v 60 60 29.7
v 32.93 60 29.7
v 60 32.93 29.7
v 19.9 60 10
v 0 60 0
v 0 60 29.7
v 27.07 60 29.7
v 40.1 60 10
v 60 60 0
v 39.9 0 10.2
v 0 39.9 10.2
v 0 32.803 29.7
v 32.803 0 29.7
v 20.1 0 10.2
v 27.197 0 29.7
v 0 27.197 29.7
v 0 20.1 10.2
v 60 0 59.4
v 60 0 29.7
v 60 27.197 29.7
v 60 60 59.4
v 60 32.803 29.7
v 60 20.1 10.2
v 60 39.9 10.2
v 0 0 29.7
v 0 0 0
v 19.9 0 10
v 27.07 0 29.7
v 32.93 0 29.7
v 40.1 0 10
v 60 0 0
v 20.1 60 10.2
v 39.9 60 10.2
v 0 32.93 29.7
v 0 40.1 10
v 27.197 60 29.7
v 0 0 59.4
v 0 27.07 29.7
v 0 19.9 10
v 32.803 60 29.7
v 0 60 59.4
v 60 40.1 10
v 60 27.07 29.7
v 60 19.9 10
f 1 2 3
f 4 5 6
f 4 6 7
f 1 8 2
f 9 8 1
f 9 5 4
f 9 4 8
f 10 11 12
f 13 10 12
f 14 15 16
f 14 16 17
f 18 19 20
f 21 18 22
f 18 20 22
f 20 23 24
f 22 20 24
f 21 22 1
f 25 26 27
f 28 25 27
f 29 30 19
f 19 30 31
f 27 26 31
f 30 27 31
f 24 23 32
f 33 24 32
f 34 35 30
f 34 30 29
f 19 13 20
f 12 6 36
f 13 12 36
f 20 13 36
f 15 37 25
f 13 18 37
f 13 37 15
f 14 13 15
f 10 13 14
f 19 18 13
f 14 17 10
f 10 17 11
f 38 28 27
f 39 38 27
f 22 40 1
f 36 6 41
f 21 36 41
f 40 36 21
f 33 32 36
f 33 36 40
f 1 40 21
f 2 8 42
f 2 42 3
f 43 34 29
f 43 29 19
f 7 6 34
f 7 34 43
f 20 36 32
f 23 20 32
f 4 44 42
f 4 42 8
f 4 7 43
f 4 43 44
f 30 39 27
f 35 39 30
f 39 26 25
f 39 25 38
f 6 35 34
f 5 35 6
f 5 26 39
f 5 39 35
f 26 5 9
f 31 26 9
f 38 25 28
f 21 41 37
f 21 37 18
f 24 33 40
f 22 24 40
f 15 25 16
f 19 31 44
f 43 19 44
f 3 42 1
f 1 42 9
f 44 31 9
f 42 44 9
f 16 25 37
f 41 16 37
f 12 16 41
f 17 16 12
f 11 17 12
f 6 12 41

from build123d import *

# Parameters (mm, degrees)
F0_W      = 60
F0_H      = 60
F1_DEPTH  = 29.7
F7_W      = 60
F7_H      = 60
F8_DEPTH  = 29.7
F9_W      = 2.0984072936
F9_H      = 7.3124578476
F14_DEPTH = 59.4


with BuildPart() as f1:
    # F0 (on Top) → F1 (new body)
    with BuildSketch(Plane.XY):
        with Locations((30, 30)):
            Rectangle(F0_W, F0_H)
    extrude(amount=F1_DEPTH)

    # F4: sweep along a path in F3
    with BuildLine(Plane.XY.offset(29.7)) as f4_path:
        Line((60, 0), (0, 60))
    # F2 (on face) → F4 (sweep, cut)
    with BuildSketch(Plane.XZ):
        Polygon((32.929786385, 29.7), (27.070213615, 29.7), (19.9, 10), (40.1, 10), align=None)
    sweep(path=f4_path.line, mode=Mode.SUBTRACT)

    # F6: sweep along a path in F3
    with BuildLine(Plane.XY.offset(29.7)) as f6_path:
        Line((60, 0), (0, 60))
    # F5 (on face) → F6 (sweep, cut)
    with BuildSketch(Plane.YZ.offset(60)):
        Polygon((32.929786385, 29.7), (27.070213615, 29.7), (19.9, 10), (40.1, 10), align=None)
    sweep(path=f6_path.line, mode=Mode.SUBTRACT)


with BuildPart() as f8:
    # F7 (on face) → F8 (new body)
    with BuildSketch(Plane.XY.offset(29.7)):
        with Locations((30, 30)):
            Rectangle(F7_W, F7_H)
    extrude(amount=F8_DEPTH)

    # F10: sweep along a path in F3
    with BuildLine(Plane.XY.offset(29.7)) as f10_path:
        Line((60, 0), (0, 60))
    # F9 (on face) → F10 (sweep)
    with BuildSketch(Plane.YZ.offset(60)):
        with Locations((29.8194439733, 33.3562289238)):
            Rectangle(F9_W, F9_H)
        Polygon((28.7702403265, 29.7), (27.1974195682, 29.7), (20.1, 10.2), (39.9, 10.2), (32.8025804318, 29.7), (30.8686476201, 29.7), align=None)
    sweep(path=f10_path.line)

    # F12: sweep along a path in F3
    with BuildLine(Plane.XY.offset(29.7)) as f12_path:
        Line((60, 0), (0, 60))
    # F11 (on face) → F12 (sweep)
    with BuildSketch(Plane.XZ):
        Polygon((32.8025804318, 29.7), (27.1974195682, 29.7), (20.1, 10.2), (39.9, 10.2), align=None)
    sweep(path=f12_path.line)

    # F13 (on face) → F14 (cut, through all)
    with BuildSketch(Plane.XY.offset(59.4)):
        Polygon((-98.9901870489, 0), (0, 0), (0, 60), (60, 60), (60, 121.1255267262), (-98.9901870489, 121.1255267262), align=None)
    extrude(amount=-F14_DEPTH, mode=Mode.SUBTRACT)


solid = Compound([f1.part, f8.part])
